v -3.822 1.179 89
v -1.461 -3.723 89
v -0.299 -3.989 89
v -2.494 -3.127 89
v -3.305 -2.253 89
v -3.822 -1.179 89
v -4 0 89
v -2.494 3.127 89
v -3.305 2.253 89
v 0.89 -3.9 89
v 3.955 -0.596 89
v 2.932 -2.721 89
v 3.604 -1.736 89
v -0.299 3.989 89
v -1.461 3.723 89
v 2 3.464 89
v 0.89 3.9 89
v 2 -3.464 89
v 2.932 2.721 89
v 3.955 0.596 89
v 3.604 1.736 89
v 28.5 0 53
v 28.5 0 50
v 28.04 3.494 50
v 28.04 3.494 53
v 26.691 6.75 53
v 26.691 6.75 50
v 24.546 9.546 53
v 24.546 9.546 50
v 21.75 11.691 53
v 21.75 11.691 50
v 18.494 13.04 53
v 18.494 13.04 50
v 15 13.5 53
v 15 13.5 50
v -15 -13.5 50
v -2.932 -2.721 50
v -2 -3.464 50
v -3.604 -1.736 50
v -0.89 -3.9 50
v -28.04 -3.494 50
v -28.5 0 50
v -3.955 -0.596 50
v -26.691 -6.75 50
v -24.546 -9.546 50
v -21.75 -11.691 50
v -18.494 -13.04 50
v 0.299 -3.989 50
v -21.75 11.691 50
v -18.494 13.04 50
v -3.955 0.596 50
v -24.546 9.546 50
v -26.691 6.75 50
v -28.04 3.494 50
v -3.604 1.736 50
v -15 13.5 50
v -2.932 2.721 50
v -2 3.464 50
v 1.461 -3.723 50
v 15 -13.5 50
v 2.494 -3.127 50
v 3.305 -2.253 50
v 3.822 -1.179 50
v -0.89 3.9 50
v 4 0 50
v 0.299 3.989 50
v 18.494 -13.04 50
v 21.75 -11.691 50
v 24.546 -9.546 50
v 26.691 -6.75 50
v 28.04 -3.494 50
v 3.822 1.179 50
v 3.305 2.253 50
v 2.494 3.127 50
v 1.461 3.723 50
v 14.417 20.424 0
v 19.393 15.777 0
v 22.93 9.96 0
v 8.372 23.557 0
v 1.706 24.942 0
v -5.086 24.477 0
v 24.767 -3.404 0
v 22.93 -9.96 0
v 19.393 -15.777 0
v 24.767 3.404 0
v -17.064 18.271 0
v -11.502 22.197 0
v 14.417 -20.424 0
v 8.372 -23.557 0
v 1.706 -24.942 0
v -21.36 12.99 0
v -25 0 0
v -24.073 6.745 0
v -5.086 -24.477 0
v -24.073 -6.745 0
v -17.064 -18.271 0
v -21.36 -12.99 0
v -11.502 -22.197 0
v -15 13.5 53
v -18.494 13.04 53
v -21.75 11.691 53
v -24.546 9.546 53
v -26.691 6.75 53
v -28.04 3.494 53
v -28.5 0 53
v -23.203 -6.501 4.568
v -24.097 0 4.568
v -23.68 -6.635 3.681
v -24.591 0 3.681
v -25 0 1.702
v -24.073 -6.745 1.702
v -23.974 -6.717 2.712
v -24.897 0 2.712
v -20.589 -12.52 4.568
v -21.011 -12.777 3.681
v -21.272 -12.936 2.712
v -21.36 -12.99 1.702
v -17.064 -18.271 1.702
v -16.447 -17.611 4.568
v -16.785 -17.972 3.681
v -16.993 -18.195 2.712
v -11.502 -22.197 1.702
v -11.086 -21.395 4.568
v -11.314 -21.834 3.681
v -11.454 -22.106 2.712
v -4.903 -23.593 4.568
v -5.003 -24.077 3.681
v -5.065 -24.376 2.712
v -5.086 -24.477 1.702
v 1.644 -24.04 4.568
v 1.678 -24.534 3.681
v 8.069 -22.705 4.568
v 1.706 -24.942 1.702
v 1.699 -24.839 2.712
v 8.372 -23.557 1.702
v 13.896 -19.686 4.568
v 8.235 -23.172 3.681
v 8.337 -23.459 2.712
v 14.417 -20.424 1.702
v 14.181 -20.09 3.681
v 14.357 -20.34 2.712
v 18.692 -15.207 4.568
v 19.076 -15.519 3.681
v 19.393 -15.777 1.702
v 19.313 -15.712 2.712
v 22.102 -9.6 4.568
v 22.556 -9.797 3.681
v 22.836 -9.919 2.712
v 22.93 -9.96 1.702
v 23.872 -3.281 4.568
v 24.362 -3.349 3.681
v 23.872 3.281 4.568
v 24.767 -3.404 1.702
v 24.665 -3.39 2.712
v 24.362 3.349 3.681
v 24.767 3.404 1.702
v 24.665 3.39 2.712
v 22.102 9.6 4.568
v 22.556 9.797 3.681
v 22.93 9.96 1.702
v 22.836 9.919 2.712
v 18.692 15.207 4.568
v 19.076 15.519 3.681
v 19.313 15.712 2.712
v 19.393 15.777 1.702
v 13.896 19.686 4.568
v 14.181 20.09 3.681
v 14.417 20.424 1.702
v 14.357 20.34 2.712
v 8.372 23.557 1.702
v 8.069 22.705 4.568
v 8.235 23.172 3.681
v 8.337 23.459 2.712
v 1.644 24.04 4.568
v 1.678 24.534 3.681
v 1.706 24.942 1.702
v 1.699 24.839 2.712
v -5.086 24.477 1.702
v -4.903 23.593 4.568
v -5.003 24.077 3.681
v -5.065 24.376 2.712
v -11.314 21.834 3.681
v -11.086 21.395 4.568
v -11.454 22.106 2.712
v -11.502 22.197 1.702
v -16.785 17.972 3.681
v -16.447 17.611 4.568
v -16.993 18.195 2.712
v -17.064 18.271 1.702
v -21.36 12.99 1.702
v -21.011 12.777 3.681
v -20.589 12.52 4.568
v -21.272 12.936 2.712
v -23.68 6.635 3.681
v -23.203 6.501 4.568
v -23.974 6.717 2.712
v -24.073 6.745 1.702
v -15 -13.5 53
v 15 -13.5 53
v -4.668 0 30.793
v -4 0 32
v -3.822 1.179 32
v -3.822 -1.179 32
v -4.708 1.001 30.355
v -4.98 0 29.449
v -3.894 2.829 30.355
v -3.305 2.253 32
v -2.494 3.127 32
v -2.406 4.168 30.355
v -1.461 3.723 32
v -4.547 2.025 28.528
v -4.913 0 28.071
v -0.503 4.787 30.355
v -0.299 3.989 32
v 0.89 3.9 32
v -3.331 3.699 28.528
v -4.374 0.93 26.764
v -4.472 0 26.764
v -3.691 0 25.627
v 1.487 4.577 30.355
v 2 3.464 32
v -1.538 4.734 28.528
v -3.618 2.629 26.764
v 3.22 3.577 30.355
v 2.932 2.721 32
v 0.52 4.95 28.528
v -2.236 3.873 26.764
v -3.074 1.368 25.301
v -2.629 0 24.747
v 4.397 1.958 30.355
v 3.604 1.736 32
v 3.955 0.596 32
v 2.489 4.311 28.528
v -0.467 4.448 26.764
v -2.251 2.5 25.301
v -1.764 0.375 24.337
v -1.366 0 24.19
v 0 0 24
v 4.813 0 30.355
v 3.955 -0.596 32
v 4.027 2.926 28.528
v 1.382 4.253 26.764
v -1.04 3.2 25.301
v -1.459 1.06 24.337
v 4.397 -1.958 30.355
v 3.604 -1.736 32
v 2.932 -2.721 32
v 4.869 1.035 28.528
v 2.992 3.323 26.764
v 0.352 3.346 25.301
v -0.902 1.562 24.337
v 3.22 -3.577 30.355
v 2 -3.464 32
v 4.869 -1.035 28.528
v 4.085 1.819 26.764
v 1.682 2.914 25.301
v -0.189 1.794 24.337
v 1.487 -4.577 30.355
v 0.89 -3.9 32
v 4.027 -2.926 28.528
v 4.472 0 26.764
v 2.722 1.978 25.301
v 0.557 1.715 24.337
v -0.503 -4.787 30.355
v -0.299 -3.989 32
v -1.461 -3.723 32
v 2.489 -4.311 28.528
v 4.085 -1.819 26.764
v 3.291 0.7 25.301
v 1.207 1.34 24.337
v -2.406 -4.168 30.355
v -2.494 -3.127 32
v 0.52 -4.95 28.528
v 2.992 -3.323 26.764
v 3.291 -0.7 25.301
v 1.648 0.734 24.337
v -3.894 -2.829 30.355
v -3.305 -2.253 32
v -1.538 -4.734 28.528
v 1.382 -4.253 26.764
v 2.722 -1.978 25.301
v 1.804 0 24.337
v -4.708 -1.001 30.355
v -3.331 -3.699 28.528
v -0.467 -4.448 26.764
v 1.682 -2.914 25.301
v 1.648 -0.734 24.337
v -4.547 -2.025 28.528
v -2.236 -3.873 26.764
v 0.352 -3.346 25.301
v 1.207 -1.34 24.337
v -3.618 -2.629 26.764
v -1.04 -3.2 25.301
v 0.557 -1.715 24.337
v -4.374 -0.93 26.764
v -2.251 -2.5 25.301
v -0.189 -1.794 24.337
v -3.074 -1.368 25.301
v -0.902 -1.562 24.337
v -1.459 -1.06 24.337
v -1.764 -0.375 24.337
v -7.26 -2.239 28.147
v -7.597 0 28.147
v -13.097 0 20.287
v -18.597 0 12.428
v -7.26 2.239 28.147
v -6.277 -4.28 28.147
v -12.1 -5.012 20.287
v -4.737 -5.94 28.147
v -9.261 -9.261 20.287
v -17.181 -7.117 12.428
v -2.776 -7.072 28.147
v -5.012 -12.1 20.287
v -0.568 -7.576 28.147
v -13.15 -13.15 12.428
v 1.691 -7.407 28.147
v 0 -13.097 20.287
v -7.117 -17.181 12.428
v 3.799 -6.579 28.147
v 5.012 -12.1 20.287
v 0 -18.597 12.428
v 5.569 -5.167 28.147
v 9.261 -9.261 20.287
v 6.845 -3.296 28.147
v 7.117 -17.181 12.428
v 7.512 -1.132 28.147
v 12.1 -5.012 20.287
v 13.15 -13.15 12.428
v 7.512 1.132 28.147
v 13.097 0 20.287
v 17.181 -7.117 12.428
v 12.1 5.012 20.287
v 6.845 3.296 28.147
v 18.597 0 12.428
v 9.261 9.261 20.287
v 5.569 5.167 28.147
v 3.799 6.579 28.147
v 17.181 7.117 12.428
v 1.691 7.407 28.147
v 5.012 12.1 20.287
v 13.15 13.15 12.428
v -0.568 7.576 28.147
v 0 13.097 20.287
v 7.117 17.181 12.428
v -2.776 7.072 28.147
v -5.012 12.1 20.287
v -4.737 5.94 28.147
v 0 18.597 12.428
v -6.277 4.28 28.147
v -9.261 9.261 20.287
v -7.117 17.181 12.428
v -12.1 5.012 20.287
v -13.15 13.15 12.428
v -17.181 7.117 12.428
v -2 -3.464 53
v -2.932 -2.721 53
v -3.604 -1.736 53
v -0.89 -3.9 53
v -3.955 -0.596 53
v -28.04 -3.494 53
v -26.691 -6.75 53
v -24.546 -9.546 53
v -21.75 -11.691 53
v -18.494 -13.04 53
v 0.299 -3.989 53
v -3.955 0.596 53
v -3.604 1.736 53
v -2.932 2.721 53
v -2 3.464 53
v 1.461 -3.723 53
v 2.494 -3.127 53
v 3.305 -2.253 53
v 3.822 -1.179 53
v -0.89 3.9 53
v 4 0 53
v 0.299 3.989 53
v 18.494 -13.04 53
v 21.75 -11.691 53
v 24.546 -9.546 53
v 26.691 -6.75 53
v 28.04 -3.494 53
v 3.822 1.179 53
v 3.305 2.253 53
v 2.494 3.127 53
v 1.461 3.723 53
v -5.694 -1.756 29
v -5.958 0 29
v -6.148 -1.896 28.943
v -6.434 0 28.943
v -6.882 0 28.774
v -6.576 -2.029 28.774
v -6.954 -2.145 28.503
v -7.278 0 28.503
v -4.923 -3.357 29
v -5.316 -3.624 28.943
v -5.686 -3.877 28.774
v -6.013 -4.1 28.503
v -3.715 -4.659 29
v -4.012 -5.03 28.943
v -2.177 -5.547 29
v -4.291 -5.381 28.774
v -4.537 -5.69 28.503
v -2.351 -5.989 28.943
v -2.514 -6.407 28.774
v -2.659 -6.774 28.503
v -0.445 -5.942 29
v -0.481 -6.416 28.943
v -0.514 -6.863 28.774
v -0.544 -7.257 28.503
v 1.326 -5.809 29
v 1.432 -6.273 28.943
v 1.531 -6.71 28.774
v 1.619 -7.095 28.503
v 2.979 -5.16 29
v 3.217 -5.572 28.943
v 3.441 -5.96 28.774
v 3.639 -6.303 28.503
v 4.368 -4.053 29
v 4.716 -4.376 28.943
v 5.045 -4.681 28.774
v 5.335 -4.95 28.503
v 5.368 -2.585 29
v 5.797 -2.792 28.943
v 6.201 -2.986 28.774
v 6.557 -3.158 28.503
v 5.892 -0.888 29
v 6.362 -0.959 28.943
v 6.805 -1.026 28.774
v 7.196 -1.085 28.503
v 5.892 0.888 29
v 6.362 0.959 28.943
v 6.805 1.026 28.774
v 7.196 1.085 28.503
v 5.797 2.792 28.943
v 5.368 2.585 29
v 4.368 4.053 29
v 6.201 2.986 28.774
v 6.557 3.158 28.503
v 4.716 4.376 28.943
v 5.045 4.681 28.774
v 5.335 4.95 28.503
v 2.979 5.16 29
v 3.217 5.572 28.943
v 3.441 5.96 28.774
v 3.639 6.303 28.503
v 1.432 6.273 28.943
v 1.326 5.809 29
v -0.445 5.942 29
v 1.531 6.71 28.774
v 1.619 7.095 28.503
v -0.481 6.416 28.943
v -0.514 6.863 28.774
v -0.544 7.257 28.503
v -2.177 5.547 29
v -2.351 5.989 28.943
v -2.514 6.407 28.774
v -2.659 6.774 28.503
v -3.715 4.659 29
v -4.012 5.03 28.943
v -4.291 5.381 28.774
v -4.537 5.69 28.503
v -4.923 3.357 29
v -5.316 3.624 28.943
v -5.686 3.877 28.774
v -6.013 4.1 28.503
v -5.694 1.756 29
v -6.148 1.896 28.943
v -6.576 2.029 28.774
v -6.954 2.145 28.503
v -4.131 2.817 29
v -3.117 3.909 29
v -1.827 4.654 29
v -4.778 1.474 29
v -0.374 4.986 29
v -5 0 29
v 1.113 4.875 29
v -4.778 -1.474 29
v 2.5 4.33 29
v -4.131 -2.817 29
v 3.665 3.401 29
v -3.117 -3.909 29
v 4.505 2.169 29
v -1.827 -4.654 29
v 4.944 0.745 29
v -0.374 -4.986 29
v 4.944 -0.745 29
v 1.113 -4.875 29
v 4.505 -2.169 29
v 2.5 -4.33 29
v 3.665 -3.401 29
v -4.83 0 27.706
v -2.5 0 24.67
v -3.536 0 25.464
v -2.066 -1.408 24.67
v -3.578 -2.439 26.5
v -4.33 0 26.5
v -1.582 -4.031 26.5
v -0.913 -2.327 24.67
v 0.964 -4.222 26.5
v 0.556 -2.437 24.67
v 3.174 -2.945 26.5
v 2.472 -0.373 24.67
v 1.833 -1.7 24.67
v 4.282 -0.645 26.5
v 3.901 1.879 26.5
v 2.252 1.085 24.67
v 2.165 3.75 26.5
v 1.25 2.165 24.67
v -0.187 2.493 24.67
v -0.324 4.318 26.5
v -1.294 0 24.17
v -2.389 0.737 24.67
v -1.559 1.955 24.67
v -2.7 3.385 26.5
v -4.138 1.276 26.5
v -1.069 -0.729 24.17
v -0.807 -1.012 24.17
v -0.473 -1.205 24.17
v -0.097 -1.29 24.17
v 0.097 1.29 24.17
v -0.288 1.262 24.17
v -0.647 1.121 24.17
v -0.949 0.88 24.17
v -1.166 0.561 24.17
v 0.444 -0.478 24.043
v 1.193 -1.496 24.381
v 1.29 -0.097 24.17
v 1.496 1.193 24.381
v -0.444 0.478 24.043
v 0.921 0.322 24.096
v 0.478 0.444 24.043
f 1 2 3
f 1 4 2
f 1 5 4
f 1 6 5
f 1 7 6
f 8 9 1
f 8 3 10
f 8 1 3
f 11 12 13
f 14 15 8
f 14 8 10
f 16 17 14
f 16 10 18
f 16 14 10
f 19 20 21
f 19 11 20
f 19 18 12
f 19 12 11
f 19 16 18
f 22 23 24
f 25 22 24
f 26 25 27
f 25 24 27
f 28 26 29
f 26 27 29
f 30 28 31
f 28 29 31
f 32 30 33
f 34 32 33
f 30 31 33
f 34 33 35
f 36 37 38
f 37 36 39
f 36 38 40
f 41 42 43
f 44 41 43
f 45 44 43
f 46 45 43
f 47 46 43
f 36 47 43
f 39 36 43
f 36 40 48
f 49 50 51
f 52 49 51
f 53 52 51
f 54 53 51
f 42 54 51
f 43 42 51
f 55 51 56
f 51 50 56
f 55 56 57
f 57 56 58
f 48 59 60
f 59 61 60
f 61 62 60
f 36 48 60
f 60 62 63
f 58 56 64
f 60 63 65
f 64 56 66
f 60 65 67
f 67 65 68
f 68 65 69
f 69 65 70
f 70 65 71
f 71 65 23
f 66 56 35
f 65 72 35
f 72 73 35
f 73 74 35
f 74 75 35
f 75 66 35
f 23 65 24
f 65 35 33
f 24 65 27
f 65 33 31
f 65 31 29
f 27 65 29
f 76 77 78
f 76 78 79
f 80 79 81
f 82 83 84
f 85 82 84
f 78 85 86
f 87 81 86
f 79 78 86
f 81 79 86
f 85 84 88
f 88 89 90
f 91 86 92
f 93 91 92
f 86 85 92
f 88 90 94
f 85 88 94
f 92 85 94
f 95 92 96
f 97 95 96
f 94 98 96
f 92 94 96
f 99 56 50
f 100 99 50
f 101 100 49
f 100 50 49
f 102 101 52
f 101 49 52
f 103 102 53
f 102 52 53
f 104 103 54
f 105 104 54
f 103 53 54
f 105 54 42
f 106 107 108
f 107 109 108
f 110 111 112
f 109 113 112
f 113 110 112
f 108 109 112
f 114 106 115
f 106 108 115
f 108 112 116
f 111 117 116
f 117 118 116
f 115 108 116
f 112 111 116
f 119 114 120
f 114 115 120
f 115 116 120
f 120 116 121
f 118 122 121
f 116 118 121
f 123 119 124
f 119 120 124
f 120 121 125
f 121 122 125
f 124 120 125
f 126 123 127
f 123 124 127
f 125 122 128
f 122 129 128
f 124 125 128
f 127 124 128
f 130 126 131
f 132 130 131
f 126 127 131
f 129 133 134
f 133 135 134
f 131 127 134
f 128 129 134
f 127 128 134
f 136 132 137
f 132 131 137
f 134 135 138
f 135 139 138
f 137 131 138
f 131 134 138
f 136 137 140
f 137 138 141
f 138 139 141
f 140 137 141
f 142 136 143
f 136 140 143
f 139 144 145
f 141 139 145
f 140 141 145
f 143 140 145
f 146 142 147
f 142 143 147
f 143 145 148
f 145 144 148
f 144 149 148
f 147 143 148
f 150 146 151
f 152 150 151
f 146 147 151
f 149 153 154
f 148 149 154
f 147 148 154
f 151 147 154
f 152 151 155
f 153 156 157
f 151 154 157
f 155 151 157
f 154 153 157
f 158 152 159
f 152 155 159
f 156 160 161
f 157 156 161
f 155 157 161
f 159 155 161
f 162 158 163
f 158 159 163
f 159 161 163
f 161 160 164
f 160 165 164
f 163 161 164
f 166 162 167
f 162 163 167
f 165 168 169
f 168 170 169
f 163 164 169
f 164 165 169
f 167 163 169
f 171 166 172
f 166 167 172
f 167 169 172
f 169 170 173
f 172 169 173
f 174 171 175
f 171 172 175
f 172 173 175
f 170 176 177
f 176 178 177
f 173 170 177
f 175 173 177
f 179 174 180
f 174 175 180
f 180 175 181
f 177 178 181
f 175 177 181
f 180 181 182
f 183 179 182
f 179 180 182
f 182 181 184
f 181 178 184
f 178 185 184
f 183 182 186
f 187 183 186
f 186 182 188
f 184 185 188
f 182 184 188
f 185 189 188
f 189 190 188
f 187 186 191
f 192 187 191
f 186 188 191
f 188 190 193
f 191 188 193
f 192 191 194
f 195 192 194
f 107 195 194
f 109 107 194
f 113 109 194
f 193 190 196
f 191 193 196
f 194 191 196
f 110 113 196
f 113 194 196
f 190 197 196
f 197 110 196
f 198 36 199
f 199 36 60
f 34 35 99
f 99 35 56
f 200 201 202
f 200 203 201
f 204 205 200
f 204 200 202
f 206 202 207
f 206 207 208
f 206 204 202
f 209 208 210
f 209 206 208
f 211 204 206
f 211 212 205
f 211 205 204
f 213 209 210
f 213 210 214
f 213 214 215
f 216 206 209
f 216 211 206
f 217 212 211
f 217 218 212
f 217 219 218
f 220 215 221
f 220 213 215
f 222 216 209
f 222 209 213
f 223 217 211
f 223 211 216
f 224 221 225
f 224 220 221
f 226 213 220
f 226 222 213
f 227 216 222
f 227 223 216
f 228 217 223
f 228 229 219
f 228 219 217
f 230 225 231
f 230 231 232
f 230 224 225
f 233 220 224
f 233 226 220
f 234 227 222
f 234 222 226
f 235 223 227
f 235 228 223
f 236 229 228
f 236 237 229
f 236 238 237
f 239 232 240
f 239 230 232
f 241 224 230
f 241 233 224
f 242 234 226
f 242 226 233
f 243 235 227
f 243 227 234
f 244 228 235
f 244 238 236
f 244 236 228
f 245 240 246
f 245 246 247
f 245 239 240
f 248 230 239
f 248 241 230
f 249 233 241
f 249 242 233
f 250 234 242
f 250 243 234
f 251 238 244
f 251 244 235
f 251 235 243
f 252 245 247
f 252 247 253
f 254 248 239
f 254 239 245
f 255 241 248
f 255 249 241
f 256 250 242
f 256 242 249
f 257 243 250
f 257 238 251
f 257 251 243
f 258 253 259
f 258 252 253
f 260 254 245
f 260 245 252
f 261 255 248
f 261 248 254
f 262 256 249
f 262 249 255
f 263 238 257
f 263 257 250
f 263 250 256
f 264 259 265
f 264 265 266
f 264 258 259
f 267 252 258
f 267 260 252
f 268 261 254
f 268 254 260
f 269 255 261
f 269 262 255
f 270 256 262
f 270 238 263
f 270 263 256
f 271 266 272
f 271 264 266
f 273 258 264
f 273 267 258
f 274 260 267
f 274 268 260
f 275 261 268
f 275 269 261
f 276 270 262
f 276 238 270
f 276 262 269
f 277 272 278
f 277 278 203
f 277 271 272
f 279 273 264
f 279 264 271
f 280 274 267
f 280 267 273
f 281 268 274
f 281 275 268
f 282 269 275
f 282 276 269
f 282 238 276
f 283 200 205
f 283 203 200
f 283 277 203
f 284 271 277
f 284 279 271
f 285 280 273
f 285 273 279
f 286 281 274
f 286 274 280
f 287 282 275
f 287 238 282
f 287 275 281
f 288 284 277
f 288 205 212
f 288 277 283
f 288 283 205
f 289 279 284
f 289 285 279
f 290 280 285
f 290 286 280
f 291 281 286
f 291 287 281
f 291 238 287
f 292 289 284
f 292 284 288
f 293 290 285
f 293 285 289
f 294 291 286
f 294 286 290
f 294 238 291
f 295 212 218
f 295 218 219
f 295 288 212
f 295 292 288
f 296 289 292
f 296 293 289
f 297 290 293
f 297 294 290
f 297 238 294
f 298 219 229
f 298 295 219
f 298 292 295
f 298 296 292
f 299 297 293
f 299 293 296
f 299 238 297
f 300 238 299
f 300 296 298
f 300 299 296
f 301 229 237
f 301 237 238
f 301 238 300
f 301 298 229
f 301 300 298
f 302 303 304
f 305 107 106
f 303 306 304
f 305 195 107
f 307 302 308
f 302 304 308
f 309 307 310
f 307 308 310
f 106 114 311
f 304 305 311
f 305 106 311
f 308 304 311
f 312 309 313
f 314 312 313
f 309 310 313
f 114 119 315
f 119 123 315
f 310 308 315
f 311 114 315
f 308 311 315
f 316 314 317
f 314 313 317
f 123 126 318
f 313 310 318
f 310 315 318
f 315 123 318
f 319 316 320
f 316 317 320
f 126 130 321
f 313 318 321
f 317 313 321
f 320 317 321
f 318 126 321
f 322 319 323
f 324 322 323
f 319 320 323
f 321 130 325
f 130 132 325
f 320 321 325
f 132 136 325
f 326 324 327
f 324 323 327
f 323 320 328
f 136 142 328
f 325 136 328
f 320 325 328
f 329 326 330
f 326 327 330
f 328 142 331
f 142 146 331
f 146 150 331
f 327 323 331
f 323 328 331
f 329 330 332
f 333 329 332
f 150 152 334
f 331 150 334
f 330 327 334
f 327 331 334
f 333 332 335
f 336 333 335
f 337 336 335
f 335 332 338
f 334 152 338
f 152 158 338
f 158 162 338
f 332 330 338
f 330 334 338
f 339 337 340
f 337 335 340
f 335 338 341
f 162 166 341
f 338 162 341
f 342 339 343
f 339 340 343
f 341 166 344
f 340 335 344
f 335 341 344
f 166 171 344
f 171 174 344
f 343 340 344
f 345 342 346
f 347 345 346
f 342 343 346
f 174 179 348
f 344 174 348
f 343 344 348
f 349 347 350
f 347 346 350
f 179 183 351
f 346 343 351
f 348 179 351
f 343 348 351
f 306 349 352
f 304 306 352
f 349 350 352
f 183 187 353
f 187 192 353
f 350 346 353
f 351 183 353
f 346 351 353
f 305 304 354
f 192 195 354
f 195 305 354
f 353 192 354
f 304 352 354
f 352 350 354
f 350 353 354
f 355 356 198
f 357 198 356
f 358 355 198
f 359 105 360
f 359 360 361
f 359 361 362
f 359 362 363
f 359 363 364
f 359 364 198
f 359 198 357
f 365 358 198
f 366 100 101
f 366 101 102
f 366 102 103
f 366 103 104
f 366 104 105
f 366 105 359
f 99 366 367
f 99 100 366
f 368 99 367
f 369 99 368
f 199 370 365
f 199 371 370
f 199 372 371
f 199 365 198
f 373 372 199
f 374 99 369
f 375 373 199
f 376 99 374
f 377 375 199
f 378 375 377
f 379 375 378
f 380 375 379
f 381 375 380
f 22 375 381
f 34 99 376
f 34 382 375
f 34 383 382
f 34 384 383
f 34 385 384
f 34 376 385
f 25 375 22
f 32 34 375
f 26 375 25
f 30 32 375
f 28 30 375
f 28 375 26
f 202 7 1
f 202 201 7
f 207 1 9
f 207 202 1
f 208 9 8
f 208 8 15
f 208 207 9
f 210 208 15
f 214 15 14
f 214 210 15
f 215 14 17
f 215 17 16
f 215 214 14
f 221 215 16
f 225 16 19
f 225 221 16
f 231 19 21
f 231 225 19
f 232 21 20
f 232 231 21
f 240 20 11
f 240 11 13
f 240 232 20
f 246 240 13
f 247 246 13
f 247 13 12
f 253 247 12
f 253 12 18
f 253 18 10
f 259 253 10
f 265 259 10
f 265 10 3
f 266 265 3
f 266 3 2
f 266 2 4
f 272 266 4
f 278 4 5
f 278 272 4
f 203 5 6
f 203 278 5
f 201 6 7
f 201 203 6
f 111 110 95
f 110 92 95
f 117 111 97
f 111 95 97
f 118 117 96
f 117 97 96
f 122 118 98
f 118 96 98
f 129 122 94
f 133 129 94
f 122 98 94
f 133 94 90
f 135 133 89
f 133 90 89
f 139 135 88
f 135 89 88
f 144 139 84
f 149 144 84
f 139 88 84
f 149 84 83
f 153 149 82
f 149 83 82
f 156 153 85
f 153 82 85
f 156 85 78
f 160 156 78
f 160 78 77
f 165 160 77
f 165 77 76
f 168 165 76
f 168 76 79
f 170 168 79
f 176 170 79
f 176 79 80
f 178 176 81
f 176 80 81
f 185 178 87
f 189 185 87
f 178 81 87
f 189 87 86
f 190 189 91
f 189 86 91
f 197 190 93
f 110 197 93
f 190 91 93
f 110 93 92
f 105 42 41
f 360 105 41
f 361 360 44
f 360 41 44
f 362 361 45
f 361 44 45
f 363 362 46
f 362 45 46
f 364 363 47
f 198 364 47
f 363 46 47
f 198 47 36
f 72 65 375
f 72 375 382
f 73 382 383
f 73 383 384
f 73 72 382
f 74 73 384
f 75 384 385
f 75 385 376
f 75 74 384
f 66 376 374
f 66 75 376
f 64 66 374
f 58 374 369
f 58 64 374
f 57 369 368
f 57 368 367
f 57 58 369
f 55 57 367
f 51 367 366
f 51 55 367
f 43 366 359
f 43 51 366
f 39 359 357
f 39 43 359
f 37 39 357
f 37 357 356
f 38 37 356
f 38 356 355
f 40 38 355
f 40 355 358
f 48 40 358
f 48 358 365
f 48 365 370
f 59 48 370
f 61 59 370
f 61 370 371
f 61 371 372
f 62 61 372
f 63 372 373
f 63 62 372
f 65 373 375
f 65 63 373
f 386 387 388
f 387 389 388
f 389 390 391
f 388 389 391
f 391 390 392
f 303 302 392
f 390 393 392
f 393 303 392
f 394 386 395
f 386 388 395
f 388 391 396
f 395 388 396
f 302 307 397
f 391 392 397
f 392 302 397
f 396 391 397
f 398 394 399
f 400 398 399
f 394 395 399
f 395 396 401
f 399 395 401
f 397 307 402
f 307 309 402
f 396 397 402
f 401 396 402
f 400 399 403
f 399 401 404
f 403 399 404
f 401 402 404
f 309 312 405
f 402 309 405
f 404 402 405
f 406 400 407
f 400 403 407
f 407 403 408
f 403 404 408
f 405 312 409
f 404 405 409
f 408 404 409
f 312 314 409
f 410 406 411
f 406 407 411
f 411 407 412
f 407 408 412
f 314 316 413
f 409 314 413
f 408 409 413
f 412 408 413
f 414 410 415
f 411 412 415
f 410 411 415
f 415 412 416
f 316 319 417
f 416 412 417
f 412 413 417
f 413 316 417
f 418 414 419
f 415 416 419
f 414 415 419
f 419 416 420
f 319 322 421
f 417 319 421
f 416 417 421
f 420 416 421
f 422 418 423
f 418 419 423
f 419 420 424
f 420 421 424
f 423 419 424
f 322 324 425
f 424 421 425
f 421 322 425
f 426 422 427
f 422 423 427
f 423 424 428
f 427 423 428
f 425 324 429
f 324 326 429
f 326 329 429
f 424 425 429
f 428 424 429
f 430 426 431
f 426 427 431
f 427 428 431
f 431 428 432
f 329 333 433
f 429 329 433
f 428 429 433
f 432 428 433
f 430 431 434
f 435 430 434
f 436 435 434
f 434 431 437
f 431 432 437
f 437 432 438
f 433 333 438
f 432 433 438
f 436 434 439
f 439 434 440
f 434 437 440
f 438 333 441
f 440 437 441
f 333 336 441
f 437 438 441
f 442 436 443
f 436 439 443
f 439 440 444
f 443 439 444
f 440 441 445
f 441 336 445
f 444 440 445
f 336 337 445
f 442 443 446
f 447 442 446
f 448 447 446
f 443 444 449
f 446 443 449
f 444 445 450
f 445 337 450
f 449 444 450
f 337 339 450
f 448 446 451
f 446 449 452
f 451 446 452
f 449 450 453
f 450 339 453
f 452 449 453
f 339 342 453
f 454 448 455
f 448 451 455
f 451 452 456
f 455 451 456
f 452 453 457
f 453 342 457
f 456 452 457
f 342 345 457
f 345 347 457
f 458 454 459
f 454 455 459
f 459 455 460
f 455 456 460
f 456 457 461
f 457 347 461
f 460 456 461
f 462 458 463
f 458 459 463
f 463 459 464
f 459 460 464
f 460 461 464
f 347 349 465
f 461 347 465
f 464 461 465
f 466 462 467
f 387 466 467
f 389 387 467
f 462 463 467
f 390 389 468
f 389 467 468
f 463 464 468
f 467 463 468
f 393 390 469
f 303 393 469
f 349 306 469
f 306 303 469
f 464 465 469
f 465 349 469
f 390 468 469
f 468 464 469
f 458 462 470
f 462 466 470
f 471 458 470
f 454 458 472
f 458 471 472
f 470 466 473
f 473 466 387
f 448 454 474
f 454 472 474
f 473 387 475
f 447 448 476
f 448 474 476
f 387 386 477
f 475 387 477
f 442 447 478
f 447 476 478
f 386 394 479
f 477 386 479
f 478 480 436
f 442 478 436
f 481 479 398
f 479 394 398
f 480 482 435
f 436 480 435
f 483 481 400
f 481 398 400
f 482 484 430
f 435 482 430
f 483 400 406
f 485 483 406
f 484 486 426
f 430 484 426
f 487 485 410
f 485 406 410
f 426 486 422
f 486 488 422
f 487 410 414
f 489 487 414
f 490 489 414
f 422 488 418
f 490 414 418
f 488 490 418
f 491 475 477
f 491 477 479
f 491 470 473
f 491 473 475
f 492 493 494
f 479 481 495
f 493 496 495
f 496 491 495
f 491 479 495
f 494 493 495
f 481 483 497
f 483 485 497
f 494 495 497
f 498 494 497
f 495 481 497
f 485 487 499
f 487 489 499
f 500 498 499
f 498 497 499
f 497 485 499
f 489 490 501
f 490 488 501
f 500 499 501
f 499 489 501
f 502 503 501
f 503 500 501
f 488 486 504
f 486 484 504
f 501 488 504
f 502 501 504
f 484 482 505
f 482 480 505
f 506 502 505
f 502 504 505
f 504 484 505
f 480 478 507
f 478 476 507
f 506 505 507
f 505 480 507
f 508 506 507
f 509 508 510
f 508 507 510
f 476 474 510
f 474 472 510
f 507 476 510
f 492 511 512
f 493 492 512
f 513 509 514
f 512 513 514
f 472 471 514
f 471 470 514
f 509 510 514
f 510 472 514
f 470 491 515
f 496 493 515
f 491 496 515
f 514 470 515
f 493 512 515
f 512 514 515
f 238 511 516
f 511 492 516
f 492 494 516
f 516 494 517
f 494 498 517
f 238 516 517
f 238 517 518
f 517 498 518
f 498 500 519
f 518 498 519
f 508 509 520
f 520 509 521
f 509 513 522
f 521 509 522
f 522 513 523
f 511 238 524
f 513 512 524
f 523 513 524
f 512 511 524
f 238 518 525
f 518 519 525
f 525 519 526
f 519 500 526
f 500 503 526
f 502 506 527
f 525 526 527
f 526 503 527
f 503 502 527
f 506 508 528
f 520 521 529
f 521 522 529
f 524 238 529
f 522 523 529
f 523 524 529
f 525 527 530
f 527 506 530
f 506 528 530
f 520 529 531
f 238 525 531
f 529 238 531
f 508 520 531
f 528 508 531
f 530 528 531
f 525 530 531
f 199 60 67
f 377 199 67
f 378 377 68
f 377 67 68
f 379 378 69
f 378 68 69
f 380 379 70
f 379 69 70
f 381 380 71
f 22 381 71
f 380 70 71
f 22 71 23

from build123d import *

# Parameters (mm, degrees)
F5_R     = 4
F6_DEPTH = 3


with BuildPart() as f1:
    # F0 (on Front) → F1 (revolve)
    with BuildSketch(Plane.XZ):
        with BuildLine():
            Line((-25, 0), (0, 0))
            Line((0, 0), (0, 24))
            ThreePointArc((0, 24), (-3.535534, 25.464466), (-5, 29))
            Line((-5, 29), (-5.958494, 29))
            ThreePointArc((-5.958494, 29), (-6.882251, 28.773887), (-7.597134, 28.146674))
            Line((-7.597134, 28.146674), (-24.096598, 4.568329))
            ThreePointArc((-24.096598, 4.568329), (-24.768804, 3.204477), (-25, 1.701645))
            Line((-25, 1.701645), (-25, 0))
        make_face()
    revolve(axis=Axis((0, 0, 14.5), (0, 0, 1)))


with BuildPart() as f3:
    # F2 (on Front) → F3 (revolve)
    with BuildSketch(Plane.XZ):
        with BuildLine():
            Line((-4, 89), (-4, 32))
            ThreePointArc((-4, 32), (-4.472136, 26.763932), (0, 24))
            Line((0, 24), (0, 34))
            Line((0, 34), (0, 89))
            Line((0, 89), (-4, 89))
        make_face()
    revolve(axis=Axis((0, 0, 29), (0, 0, -1)))


with BuildPart() as f6:
    # F5 (on offset) → F6 (new body)
    with BuildSketch(Plane.XY.offset(50)):
        with BuildLine():
            Line((15, 13.5), (-15, 13.5))
            ThreePointArc((-15, 13.5), (-24.545942, 9.545942), (-28.5, 0))
            ThreePointArc((-28.5, 0), (-24.545942, -9.545942), (-15, -13.5))
            Line((-15, -13.5), (15, -13.5))
            ThreePointArc((15, -13.5), (24.545942, -9.545942), (28.5, 0))
            ThreePointArc((28.5, 0), (24.545942, 9.545942), (15, 13.5))
        make_face()
        Circle(F5_R, mode=Mode.SUBTRACT)
    extrude(amount=F6_DEPTH)


solid = Compound([f1.part, f3.part, f6.part])
